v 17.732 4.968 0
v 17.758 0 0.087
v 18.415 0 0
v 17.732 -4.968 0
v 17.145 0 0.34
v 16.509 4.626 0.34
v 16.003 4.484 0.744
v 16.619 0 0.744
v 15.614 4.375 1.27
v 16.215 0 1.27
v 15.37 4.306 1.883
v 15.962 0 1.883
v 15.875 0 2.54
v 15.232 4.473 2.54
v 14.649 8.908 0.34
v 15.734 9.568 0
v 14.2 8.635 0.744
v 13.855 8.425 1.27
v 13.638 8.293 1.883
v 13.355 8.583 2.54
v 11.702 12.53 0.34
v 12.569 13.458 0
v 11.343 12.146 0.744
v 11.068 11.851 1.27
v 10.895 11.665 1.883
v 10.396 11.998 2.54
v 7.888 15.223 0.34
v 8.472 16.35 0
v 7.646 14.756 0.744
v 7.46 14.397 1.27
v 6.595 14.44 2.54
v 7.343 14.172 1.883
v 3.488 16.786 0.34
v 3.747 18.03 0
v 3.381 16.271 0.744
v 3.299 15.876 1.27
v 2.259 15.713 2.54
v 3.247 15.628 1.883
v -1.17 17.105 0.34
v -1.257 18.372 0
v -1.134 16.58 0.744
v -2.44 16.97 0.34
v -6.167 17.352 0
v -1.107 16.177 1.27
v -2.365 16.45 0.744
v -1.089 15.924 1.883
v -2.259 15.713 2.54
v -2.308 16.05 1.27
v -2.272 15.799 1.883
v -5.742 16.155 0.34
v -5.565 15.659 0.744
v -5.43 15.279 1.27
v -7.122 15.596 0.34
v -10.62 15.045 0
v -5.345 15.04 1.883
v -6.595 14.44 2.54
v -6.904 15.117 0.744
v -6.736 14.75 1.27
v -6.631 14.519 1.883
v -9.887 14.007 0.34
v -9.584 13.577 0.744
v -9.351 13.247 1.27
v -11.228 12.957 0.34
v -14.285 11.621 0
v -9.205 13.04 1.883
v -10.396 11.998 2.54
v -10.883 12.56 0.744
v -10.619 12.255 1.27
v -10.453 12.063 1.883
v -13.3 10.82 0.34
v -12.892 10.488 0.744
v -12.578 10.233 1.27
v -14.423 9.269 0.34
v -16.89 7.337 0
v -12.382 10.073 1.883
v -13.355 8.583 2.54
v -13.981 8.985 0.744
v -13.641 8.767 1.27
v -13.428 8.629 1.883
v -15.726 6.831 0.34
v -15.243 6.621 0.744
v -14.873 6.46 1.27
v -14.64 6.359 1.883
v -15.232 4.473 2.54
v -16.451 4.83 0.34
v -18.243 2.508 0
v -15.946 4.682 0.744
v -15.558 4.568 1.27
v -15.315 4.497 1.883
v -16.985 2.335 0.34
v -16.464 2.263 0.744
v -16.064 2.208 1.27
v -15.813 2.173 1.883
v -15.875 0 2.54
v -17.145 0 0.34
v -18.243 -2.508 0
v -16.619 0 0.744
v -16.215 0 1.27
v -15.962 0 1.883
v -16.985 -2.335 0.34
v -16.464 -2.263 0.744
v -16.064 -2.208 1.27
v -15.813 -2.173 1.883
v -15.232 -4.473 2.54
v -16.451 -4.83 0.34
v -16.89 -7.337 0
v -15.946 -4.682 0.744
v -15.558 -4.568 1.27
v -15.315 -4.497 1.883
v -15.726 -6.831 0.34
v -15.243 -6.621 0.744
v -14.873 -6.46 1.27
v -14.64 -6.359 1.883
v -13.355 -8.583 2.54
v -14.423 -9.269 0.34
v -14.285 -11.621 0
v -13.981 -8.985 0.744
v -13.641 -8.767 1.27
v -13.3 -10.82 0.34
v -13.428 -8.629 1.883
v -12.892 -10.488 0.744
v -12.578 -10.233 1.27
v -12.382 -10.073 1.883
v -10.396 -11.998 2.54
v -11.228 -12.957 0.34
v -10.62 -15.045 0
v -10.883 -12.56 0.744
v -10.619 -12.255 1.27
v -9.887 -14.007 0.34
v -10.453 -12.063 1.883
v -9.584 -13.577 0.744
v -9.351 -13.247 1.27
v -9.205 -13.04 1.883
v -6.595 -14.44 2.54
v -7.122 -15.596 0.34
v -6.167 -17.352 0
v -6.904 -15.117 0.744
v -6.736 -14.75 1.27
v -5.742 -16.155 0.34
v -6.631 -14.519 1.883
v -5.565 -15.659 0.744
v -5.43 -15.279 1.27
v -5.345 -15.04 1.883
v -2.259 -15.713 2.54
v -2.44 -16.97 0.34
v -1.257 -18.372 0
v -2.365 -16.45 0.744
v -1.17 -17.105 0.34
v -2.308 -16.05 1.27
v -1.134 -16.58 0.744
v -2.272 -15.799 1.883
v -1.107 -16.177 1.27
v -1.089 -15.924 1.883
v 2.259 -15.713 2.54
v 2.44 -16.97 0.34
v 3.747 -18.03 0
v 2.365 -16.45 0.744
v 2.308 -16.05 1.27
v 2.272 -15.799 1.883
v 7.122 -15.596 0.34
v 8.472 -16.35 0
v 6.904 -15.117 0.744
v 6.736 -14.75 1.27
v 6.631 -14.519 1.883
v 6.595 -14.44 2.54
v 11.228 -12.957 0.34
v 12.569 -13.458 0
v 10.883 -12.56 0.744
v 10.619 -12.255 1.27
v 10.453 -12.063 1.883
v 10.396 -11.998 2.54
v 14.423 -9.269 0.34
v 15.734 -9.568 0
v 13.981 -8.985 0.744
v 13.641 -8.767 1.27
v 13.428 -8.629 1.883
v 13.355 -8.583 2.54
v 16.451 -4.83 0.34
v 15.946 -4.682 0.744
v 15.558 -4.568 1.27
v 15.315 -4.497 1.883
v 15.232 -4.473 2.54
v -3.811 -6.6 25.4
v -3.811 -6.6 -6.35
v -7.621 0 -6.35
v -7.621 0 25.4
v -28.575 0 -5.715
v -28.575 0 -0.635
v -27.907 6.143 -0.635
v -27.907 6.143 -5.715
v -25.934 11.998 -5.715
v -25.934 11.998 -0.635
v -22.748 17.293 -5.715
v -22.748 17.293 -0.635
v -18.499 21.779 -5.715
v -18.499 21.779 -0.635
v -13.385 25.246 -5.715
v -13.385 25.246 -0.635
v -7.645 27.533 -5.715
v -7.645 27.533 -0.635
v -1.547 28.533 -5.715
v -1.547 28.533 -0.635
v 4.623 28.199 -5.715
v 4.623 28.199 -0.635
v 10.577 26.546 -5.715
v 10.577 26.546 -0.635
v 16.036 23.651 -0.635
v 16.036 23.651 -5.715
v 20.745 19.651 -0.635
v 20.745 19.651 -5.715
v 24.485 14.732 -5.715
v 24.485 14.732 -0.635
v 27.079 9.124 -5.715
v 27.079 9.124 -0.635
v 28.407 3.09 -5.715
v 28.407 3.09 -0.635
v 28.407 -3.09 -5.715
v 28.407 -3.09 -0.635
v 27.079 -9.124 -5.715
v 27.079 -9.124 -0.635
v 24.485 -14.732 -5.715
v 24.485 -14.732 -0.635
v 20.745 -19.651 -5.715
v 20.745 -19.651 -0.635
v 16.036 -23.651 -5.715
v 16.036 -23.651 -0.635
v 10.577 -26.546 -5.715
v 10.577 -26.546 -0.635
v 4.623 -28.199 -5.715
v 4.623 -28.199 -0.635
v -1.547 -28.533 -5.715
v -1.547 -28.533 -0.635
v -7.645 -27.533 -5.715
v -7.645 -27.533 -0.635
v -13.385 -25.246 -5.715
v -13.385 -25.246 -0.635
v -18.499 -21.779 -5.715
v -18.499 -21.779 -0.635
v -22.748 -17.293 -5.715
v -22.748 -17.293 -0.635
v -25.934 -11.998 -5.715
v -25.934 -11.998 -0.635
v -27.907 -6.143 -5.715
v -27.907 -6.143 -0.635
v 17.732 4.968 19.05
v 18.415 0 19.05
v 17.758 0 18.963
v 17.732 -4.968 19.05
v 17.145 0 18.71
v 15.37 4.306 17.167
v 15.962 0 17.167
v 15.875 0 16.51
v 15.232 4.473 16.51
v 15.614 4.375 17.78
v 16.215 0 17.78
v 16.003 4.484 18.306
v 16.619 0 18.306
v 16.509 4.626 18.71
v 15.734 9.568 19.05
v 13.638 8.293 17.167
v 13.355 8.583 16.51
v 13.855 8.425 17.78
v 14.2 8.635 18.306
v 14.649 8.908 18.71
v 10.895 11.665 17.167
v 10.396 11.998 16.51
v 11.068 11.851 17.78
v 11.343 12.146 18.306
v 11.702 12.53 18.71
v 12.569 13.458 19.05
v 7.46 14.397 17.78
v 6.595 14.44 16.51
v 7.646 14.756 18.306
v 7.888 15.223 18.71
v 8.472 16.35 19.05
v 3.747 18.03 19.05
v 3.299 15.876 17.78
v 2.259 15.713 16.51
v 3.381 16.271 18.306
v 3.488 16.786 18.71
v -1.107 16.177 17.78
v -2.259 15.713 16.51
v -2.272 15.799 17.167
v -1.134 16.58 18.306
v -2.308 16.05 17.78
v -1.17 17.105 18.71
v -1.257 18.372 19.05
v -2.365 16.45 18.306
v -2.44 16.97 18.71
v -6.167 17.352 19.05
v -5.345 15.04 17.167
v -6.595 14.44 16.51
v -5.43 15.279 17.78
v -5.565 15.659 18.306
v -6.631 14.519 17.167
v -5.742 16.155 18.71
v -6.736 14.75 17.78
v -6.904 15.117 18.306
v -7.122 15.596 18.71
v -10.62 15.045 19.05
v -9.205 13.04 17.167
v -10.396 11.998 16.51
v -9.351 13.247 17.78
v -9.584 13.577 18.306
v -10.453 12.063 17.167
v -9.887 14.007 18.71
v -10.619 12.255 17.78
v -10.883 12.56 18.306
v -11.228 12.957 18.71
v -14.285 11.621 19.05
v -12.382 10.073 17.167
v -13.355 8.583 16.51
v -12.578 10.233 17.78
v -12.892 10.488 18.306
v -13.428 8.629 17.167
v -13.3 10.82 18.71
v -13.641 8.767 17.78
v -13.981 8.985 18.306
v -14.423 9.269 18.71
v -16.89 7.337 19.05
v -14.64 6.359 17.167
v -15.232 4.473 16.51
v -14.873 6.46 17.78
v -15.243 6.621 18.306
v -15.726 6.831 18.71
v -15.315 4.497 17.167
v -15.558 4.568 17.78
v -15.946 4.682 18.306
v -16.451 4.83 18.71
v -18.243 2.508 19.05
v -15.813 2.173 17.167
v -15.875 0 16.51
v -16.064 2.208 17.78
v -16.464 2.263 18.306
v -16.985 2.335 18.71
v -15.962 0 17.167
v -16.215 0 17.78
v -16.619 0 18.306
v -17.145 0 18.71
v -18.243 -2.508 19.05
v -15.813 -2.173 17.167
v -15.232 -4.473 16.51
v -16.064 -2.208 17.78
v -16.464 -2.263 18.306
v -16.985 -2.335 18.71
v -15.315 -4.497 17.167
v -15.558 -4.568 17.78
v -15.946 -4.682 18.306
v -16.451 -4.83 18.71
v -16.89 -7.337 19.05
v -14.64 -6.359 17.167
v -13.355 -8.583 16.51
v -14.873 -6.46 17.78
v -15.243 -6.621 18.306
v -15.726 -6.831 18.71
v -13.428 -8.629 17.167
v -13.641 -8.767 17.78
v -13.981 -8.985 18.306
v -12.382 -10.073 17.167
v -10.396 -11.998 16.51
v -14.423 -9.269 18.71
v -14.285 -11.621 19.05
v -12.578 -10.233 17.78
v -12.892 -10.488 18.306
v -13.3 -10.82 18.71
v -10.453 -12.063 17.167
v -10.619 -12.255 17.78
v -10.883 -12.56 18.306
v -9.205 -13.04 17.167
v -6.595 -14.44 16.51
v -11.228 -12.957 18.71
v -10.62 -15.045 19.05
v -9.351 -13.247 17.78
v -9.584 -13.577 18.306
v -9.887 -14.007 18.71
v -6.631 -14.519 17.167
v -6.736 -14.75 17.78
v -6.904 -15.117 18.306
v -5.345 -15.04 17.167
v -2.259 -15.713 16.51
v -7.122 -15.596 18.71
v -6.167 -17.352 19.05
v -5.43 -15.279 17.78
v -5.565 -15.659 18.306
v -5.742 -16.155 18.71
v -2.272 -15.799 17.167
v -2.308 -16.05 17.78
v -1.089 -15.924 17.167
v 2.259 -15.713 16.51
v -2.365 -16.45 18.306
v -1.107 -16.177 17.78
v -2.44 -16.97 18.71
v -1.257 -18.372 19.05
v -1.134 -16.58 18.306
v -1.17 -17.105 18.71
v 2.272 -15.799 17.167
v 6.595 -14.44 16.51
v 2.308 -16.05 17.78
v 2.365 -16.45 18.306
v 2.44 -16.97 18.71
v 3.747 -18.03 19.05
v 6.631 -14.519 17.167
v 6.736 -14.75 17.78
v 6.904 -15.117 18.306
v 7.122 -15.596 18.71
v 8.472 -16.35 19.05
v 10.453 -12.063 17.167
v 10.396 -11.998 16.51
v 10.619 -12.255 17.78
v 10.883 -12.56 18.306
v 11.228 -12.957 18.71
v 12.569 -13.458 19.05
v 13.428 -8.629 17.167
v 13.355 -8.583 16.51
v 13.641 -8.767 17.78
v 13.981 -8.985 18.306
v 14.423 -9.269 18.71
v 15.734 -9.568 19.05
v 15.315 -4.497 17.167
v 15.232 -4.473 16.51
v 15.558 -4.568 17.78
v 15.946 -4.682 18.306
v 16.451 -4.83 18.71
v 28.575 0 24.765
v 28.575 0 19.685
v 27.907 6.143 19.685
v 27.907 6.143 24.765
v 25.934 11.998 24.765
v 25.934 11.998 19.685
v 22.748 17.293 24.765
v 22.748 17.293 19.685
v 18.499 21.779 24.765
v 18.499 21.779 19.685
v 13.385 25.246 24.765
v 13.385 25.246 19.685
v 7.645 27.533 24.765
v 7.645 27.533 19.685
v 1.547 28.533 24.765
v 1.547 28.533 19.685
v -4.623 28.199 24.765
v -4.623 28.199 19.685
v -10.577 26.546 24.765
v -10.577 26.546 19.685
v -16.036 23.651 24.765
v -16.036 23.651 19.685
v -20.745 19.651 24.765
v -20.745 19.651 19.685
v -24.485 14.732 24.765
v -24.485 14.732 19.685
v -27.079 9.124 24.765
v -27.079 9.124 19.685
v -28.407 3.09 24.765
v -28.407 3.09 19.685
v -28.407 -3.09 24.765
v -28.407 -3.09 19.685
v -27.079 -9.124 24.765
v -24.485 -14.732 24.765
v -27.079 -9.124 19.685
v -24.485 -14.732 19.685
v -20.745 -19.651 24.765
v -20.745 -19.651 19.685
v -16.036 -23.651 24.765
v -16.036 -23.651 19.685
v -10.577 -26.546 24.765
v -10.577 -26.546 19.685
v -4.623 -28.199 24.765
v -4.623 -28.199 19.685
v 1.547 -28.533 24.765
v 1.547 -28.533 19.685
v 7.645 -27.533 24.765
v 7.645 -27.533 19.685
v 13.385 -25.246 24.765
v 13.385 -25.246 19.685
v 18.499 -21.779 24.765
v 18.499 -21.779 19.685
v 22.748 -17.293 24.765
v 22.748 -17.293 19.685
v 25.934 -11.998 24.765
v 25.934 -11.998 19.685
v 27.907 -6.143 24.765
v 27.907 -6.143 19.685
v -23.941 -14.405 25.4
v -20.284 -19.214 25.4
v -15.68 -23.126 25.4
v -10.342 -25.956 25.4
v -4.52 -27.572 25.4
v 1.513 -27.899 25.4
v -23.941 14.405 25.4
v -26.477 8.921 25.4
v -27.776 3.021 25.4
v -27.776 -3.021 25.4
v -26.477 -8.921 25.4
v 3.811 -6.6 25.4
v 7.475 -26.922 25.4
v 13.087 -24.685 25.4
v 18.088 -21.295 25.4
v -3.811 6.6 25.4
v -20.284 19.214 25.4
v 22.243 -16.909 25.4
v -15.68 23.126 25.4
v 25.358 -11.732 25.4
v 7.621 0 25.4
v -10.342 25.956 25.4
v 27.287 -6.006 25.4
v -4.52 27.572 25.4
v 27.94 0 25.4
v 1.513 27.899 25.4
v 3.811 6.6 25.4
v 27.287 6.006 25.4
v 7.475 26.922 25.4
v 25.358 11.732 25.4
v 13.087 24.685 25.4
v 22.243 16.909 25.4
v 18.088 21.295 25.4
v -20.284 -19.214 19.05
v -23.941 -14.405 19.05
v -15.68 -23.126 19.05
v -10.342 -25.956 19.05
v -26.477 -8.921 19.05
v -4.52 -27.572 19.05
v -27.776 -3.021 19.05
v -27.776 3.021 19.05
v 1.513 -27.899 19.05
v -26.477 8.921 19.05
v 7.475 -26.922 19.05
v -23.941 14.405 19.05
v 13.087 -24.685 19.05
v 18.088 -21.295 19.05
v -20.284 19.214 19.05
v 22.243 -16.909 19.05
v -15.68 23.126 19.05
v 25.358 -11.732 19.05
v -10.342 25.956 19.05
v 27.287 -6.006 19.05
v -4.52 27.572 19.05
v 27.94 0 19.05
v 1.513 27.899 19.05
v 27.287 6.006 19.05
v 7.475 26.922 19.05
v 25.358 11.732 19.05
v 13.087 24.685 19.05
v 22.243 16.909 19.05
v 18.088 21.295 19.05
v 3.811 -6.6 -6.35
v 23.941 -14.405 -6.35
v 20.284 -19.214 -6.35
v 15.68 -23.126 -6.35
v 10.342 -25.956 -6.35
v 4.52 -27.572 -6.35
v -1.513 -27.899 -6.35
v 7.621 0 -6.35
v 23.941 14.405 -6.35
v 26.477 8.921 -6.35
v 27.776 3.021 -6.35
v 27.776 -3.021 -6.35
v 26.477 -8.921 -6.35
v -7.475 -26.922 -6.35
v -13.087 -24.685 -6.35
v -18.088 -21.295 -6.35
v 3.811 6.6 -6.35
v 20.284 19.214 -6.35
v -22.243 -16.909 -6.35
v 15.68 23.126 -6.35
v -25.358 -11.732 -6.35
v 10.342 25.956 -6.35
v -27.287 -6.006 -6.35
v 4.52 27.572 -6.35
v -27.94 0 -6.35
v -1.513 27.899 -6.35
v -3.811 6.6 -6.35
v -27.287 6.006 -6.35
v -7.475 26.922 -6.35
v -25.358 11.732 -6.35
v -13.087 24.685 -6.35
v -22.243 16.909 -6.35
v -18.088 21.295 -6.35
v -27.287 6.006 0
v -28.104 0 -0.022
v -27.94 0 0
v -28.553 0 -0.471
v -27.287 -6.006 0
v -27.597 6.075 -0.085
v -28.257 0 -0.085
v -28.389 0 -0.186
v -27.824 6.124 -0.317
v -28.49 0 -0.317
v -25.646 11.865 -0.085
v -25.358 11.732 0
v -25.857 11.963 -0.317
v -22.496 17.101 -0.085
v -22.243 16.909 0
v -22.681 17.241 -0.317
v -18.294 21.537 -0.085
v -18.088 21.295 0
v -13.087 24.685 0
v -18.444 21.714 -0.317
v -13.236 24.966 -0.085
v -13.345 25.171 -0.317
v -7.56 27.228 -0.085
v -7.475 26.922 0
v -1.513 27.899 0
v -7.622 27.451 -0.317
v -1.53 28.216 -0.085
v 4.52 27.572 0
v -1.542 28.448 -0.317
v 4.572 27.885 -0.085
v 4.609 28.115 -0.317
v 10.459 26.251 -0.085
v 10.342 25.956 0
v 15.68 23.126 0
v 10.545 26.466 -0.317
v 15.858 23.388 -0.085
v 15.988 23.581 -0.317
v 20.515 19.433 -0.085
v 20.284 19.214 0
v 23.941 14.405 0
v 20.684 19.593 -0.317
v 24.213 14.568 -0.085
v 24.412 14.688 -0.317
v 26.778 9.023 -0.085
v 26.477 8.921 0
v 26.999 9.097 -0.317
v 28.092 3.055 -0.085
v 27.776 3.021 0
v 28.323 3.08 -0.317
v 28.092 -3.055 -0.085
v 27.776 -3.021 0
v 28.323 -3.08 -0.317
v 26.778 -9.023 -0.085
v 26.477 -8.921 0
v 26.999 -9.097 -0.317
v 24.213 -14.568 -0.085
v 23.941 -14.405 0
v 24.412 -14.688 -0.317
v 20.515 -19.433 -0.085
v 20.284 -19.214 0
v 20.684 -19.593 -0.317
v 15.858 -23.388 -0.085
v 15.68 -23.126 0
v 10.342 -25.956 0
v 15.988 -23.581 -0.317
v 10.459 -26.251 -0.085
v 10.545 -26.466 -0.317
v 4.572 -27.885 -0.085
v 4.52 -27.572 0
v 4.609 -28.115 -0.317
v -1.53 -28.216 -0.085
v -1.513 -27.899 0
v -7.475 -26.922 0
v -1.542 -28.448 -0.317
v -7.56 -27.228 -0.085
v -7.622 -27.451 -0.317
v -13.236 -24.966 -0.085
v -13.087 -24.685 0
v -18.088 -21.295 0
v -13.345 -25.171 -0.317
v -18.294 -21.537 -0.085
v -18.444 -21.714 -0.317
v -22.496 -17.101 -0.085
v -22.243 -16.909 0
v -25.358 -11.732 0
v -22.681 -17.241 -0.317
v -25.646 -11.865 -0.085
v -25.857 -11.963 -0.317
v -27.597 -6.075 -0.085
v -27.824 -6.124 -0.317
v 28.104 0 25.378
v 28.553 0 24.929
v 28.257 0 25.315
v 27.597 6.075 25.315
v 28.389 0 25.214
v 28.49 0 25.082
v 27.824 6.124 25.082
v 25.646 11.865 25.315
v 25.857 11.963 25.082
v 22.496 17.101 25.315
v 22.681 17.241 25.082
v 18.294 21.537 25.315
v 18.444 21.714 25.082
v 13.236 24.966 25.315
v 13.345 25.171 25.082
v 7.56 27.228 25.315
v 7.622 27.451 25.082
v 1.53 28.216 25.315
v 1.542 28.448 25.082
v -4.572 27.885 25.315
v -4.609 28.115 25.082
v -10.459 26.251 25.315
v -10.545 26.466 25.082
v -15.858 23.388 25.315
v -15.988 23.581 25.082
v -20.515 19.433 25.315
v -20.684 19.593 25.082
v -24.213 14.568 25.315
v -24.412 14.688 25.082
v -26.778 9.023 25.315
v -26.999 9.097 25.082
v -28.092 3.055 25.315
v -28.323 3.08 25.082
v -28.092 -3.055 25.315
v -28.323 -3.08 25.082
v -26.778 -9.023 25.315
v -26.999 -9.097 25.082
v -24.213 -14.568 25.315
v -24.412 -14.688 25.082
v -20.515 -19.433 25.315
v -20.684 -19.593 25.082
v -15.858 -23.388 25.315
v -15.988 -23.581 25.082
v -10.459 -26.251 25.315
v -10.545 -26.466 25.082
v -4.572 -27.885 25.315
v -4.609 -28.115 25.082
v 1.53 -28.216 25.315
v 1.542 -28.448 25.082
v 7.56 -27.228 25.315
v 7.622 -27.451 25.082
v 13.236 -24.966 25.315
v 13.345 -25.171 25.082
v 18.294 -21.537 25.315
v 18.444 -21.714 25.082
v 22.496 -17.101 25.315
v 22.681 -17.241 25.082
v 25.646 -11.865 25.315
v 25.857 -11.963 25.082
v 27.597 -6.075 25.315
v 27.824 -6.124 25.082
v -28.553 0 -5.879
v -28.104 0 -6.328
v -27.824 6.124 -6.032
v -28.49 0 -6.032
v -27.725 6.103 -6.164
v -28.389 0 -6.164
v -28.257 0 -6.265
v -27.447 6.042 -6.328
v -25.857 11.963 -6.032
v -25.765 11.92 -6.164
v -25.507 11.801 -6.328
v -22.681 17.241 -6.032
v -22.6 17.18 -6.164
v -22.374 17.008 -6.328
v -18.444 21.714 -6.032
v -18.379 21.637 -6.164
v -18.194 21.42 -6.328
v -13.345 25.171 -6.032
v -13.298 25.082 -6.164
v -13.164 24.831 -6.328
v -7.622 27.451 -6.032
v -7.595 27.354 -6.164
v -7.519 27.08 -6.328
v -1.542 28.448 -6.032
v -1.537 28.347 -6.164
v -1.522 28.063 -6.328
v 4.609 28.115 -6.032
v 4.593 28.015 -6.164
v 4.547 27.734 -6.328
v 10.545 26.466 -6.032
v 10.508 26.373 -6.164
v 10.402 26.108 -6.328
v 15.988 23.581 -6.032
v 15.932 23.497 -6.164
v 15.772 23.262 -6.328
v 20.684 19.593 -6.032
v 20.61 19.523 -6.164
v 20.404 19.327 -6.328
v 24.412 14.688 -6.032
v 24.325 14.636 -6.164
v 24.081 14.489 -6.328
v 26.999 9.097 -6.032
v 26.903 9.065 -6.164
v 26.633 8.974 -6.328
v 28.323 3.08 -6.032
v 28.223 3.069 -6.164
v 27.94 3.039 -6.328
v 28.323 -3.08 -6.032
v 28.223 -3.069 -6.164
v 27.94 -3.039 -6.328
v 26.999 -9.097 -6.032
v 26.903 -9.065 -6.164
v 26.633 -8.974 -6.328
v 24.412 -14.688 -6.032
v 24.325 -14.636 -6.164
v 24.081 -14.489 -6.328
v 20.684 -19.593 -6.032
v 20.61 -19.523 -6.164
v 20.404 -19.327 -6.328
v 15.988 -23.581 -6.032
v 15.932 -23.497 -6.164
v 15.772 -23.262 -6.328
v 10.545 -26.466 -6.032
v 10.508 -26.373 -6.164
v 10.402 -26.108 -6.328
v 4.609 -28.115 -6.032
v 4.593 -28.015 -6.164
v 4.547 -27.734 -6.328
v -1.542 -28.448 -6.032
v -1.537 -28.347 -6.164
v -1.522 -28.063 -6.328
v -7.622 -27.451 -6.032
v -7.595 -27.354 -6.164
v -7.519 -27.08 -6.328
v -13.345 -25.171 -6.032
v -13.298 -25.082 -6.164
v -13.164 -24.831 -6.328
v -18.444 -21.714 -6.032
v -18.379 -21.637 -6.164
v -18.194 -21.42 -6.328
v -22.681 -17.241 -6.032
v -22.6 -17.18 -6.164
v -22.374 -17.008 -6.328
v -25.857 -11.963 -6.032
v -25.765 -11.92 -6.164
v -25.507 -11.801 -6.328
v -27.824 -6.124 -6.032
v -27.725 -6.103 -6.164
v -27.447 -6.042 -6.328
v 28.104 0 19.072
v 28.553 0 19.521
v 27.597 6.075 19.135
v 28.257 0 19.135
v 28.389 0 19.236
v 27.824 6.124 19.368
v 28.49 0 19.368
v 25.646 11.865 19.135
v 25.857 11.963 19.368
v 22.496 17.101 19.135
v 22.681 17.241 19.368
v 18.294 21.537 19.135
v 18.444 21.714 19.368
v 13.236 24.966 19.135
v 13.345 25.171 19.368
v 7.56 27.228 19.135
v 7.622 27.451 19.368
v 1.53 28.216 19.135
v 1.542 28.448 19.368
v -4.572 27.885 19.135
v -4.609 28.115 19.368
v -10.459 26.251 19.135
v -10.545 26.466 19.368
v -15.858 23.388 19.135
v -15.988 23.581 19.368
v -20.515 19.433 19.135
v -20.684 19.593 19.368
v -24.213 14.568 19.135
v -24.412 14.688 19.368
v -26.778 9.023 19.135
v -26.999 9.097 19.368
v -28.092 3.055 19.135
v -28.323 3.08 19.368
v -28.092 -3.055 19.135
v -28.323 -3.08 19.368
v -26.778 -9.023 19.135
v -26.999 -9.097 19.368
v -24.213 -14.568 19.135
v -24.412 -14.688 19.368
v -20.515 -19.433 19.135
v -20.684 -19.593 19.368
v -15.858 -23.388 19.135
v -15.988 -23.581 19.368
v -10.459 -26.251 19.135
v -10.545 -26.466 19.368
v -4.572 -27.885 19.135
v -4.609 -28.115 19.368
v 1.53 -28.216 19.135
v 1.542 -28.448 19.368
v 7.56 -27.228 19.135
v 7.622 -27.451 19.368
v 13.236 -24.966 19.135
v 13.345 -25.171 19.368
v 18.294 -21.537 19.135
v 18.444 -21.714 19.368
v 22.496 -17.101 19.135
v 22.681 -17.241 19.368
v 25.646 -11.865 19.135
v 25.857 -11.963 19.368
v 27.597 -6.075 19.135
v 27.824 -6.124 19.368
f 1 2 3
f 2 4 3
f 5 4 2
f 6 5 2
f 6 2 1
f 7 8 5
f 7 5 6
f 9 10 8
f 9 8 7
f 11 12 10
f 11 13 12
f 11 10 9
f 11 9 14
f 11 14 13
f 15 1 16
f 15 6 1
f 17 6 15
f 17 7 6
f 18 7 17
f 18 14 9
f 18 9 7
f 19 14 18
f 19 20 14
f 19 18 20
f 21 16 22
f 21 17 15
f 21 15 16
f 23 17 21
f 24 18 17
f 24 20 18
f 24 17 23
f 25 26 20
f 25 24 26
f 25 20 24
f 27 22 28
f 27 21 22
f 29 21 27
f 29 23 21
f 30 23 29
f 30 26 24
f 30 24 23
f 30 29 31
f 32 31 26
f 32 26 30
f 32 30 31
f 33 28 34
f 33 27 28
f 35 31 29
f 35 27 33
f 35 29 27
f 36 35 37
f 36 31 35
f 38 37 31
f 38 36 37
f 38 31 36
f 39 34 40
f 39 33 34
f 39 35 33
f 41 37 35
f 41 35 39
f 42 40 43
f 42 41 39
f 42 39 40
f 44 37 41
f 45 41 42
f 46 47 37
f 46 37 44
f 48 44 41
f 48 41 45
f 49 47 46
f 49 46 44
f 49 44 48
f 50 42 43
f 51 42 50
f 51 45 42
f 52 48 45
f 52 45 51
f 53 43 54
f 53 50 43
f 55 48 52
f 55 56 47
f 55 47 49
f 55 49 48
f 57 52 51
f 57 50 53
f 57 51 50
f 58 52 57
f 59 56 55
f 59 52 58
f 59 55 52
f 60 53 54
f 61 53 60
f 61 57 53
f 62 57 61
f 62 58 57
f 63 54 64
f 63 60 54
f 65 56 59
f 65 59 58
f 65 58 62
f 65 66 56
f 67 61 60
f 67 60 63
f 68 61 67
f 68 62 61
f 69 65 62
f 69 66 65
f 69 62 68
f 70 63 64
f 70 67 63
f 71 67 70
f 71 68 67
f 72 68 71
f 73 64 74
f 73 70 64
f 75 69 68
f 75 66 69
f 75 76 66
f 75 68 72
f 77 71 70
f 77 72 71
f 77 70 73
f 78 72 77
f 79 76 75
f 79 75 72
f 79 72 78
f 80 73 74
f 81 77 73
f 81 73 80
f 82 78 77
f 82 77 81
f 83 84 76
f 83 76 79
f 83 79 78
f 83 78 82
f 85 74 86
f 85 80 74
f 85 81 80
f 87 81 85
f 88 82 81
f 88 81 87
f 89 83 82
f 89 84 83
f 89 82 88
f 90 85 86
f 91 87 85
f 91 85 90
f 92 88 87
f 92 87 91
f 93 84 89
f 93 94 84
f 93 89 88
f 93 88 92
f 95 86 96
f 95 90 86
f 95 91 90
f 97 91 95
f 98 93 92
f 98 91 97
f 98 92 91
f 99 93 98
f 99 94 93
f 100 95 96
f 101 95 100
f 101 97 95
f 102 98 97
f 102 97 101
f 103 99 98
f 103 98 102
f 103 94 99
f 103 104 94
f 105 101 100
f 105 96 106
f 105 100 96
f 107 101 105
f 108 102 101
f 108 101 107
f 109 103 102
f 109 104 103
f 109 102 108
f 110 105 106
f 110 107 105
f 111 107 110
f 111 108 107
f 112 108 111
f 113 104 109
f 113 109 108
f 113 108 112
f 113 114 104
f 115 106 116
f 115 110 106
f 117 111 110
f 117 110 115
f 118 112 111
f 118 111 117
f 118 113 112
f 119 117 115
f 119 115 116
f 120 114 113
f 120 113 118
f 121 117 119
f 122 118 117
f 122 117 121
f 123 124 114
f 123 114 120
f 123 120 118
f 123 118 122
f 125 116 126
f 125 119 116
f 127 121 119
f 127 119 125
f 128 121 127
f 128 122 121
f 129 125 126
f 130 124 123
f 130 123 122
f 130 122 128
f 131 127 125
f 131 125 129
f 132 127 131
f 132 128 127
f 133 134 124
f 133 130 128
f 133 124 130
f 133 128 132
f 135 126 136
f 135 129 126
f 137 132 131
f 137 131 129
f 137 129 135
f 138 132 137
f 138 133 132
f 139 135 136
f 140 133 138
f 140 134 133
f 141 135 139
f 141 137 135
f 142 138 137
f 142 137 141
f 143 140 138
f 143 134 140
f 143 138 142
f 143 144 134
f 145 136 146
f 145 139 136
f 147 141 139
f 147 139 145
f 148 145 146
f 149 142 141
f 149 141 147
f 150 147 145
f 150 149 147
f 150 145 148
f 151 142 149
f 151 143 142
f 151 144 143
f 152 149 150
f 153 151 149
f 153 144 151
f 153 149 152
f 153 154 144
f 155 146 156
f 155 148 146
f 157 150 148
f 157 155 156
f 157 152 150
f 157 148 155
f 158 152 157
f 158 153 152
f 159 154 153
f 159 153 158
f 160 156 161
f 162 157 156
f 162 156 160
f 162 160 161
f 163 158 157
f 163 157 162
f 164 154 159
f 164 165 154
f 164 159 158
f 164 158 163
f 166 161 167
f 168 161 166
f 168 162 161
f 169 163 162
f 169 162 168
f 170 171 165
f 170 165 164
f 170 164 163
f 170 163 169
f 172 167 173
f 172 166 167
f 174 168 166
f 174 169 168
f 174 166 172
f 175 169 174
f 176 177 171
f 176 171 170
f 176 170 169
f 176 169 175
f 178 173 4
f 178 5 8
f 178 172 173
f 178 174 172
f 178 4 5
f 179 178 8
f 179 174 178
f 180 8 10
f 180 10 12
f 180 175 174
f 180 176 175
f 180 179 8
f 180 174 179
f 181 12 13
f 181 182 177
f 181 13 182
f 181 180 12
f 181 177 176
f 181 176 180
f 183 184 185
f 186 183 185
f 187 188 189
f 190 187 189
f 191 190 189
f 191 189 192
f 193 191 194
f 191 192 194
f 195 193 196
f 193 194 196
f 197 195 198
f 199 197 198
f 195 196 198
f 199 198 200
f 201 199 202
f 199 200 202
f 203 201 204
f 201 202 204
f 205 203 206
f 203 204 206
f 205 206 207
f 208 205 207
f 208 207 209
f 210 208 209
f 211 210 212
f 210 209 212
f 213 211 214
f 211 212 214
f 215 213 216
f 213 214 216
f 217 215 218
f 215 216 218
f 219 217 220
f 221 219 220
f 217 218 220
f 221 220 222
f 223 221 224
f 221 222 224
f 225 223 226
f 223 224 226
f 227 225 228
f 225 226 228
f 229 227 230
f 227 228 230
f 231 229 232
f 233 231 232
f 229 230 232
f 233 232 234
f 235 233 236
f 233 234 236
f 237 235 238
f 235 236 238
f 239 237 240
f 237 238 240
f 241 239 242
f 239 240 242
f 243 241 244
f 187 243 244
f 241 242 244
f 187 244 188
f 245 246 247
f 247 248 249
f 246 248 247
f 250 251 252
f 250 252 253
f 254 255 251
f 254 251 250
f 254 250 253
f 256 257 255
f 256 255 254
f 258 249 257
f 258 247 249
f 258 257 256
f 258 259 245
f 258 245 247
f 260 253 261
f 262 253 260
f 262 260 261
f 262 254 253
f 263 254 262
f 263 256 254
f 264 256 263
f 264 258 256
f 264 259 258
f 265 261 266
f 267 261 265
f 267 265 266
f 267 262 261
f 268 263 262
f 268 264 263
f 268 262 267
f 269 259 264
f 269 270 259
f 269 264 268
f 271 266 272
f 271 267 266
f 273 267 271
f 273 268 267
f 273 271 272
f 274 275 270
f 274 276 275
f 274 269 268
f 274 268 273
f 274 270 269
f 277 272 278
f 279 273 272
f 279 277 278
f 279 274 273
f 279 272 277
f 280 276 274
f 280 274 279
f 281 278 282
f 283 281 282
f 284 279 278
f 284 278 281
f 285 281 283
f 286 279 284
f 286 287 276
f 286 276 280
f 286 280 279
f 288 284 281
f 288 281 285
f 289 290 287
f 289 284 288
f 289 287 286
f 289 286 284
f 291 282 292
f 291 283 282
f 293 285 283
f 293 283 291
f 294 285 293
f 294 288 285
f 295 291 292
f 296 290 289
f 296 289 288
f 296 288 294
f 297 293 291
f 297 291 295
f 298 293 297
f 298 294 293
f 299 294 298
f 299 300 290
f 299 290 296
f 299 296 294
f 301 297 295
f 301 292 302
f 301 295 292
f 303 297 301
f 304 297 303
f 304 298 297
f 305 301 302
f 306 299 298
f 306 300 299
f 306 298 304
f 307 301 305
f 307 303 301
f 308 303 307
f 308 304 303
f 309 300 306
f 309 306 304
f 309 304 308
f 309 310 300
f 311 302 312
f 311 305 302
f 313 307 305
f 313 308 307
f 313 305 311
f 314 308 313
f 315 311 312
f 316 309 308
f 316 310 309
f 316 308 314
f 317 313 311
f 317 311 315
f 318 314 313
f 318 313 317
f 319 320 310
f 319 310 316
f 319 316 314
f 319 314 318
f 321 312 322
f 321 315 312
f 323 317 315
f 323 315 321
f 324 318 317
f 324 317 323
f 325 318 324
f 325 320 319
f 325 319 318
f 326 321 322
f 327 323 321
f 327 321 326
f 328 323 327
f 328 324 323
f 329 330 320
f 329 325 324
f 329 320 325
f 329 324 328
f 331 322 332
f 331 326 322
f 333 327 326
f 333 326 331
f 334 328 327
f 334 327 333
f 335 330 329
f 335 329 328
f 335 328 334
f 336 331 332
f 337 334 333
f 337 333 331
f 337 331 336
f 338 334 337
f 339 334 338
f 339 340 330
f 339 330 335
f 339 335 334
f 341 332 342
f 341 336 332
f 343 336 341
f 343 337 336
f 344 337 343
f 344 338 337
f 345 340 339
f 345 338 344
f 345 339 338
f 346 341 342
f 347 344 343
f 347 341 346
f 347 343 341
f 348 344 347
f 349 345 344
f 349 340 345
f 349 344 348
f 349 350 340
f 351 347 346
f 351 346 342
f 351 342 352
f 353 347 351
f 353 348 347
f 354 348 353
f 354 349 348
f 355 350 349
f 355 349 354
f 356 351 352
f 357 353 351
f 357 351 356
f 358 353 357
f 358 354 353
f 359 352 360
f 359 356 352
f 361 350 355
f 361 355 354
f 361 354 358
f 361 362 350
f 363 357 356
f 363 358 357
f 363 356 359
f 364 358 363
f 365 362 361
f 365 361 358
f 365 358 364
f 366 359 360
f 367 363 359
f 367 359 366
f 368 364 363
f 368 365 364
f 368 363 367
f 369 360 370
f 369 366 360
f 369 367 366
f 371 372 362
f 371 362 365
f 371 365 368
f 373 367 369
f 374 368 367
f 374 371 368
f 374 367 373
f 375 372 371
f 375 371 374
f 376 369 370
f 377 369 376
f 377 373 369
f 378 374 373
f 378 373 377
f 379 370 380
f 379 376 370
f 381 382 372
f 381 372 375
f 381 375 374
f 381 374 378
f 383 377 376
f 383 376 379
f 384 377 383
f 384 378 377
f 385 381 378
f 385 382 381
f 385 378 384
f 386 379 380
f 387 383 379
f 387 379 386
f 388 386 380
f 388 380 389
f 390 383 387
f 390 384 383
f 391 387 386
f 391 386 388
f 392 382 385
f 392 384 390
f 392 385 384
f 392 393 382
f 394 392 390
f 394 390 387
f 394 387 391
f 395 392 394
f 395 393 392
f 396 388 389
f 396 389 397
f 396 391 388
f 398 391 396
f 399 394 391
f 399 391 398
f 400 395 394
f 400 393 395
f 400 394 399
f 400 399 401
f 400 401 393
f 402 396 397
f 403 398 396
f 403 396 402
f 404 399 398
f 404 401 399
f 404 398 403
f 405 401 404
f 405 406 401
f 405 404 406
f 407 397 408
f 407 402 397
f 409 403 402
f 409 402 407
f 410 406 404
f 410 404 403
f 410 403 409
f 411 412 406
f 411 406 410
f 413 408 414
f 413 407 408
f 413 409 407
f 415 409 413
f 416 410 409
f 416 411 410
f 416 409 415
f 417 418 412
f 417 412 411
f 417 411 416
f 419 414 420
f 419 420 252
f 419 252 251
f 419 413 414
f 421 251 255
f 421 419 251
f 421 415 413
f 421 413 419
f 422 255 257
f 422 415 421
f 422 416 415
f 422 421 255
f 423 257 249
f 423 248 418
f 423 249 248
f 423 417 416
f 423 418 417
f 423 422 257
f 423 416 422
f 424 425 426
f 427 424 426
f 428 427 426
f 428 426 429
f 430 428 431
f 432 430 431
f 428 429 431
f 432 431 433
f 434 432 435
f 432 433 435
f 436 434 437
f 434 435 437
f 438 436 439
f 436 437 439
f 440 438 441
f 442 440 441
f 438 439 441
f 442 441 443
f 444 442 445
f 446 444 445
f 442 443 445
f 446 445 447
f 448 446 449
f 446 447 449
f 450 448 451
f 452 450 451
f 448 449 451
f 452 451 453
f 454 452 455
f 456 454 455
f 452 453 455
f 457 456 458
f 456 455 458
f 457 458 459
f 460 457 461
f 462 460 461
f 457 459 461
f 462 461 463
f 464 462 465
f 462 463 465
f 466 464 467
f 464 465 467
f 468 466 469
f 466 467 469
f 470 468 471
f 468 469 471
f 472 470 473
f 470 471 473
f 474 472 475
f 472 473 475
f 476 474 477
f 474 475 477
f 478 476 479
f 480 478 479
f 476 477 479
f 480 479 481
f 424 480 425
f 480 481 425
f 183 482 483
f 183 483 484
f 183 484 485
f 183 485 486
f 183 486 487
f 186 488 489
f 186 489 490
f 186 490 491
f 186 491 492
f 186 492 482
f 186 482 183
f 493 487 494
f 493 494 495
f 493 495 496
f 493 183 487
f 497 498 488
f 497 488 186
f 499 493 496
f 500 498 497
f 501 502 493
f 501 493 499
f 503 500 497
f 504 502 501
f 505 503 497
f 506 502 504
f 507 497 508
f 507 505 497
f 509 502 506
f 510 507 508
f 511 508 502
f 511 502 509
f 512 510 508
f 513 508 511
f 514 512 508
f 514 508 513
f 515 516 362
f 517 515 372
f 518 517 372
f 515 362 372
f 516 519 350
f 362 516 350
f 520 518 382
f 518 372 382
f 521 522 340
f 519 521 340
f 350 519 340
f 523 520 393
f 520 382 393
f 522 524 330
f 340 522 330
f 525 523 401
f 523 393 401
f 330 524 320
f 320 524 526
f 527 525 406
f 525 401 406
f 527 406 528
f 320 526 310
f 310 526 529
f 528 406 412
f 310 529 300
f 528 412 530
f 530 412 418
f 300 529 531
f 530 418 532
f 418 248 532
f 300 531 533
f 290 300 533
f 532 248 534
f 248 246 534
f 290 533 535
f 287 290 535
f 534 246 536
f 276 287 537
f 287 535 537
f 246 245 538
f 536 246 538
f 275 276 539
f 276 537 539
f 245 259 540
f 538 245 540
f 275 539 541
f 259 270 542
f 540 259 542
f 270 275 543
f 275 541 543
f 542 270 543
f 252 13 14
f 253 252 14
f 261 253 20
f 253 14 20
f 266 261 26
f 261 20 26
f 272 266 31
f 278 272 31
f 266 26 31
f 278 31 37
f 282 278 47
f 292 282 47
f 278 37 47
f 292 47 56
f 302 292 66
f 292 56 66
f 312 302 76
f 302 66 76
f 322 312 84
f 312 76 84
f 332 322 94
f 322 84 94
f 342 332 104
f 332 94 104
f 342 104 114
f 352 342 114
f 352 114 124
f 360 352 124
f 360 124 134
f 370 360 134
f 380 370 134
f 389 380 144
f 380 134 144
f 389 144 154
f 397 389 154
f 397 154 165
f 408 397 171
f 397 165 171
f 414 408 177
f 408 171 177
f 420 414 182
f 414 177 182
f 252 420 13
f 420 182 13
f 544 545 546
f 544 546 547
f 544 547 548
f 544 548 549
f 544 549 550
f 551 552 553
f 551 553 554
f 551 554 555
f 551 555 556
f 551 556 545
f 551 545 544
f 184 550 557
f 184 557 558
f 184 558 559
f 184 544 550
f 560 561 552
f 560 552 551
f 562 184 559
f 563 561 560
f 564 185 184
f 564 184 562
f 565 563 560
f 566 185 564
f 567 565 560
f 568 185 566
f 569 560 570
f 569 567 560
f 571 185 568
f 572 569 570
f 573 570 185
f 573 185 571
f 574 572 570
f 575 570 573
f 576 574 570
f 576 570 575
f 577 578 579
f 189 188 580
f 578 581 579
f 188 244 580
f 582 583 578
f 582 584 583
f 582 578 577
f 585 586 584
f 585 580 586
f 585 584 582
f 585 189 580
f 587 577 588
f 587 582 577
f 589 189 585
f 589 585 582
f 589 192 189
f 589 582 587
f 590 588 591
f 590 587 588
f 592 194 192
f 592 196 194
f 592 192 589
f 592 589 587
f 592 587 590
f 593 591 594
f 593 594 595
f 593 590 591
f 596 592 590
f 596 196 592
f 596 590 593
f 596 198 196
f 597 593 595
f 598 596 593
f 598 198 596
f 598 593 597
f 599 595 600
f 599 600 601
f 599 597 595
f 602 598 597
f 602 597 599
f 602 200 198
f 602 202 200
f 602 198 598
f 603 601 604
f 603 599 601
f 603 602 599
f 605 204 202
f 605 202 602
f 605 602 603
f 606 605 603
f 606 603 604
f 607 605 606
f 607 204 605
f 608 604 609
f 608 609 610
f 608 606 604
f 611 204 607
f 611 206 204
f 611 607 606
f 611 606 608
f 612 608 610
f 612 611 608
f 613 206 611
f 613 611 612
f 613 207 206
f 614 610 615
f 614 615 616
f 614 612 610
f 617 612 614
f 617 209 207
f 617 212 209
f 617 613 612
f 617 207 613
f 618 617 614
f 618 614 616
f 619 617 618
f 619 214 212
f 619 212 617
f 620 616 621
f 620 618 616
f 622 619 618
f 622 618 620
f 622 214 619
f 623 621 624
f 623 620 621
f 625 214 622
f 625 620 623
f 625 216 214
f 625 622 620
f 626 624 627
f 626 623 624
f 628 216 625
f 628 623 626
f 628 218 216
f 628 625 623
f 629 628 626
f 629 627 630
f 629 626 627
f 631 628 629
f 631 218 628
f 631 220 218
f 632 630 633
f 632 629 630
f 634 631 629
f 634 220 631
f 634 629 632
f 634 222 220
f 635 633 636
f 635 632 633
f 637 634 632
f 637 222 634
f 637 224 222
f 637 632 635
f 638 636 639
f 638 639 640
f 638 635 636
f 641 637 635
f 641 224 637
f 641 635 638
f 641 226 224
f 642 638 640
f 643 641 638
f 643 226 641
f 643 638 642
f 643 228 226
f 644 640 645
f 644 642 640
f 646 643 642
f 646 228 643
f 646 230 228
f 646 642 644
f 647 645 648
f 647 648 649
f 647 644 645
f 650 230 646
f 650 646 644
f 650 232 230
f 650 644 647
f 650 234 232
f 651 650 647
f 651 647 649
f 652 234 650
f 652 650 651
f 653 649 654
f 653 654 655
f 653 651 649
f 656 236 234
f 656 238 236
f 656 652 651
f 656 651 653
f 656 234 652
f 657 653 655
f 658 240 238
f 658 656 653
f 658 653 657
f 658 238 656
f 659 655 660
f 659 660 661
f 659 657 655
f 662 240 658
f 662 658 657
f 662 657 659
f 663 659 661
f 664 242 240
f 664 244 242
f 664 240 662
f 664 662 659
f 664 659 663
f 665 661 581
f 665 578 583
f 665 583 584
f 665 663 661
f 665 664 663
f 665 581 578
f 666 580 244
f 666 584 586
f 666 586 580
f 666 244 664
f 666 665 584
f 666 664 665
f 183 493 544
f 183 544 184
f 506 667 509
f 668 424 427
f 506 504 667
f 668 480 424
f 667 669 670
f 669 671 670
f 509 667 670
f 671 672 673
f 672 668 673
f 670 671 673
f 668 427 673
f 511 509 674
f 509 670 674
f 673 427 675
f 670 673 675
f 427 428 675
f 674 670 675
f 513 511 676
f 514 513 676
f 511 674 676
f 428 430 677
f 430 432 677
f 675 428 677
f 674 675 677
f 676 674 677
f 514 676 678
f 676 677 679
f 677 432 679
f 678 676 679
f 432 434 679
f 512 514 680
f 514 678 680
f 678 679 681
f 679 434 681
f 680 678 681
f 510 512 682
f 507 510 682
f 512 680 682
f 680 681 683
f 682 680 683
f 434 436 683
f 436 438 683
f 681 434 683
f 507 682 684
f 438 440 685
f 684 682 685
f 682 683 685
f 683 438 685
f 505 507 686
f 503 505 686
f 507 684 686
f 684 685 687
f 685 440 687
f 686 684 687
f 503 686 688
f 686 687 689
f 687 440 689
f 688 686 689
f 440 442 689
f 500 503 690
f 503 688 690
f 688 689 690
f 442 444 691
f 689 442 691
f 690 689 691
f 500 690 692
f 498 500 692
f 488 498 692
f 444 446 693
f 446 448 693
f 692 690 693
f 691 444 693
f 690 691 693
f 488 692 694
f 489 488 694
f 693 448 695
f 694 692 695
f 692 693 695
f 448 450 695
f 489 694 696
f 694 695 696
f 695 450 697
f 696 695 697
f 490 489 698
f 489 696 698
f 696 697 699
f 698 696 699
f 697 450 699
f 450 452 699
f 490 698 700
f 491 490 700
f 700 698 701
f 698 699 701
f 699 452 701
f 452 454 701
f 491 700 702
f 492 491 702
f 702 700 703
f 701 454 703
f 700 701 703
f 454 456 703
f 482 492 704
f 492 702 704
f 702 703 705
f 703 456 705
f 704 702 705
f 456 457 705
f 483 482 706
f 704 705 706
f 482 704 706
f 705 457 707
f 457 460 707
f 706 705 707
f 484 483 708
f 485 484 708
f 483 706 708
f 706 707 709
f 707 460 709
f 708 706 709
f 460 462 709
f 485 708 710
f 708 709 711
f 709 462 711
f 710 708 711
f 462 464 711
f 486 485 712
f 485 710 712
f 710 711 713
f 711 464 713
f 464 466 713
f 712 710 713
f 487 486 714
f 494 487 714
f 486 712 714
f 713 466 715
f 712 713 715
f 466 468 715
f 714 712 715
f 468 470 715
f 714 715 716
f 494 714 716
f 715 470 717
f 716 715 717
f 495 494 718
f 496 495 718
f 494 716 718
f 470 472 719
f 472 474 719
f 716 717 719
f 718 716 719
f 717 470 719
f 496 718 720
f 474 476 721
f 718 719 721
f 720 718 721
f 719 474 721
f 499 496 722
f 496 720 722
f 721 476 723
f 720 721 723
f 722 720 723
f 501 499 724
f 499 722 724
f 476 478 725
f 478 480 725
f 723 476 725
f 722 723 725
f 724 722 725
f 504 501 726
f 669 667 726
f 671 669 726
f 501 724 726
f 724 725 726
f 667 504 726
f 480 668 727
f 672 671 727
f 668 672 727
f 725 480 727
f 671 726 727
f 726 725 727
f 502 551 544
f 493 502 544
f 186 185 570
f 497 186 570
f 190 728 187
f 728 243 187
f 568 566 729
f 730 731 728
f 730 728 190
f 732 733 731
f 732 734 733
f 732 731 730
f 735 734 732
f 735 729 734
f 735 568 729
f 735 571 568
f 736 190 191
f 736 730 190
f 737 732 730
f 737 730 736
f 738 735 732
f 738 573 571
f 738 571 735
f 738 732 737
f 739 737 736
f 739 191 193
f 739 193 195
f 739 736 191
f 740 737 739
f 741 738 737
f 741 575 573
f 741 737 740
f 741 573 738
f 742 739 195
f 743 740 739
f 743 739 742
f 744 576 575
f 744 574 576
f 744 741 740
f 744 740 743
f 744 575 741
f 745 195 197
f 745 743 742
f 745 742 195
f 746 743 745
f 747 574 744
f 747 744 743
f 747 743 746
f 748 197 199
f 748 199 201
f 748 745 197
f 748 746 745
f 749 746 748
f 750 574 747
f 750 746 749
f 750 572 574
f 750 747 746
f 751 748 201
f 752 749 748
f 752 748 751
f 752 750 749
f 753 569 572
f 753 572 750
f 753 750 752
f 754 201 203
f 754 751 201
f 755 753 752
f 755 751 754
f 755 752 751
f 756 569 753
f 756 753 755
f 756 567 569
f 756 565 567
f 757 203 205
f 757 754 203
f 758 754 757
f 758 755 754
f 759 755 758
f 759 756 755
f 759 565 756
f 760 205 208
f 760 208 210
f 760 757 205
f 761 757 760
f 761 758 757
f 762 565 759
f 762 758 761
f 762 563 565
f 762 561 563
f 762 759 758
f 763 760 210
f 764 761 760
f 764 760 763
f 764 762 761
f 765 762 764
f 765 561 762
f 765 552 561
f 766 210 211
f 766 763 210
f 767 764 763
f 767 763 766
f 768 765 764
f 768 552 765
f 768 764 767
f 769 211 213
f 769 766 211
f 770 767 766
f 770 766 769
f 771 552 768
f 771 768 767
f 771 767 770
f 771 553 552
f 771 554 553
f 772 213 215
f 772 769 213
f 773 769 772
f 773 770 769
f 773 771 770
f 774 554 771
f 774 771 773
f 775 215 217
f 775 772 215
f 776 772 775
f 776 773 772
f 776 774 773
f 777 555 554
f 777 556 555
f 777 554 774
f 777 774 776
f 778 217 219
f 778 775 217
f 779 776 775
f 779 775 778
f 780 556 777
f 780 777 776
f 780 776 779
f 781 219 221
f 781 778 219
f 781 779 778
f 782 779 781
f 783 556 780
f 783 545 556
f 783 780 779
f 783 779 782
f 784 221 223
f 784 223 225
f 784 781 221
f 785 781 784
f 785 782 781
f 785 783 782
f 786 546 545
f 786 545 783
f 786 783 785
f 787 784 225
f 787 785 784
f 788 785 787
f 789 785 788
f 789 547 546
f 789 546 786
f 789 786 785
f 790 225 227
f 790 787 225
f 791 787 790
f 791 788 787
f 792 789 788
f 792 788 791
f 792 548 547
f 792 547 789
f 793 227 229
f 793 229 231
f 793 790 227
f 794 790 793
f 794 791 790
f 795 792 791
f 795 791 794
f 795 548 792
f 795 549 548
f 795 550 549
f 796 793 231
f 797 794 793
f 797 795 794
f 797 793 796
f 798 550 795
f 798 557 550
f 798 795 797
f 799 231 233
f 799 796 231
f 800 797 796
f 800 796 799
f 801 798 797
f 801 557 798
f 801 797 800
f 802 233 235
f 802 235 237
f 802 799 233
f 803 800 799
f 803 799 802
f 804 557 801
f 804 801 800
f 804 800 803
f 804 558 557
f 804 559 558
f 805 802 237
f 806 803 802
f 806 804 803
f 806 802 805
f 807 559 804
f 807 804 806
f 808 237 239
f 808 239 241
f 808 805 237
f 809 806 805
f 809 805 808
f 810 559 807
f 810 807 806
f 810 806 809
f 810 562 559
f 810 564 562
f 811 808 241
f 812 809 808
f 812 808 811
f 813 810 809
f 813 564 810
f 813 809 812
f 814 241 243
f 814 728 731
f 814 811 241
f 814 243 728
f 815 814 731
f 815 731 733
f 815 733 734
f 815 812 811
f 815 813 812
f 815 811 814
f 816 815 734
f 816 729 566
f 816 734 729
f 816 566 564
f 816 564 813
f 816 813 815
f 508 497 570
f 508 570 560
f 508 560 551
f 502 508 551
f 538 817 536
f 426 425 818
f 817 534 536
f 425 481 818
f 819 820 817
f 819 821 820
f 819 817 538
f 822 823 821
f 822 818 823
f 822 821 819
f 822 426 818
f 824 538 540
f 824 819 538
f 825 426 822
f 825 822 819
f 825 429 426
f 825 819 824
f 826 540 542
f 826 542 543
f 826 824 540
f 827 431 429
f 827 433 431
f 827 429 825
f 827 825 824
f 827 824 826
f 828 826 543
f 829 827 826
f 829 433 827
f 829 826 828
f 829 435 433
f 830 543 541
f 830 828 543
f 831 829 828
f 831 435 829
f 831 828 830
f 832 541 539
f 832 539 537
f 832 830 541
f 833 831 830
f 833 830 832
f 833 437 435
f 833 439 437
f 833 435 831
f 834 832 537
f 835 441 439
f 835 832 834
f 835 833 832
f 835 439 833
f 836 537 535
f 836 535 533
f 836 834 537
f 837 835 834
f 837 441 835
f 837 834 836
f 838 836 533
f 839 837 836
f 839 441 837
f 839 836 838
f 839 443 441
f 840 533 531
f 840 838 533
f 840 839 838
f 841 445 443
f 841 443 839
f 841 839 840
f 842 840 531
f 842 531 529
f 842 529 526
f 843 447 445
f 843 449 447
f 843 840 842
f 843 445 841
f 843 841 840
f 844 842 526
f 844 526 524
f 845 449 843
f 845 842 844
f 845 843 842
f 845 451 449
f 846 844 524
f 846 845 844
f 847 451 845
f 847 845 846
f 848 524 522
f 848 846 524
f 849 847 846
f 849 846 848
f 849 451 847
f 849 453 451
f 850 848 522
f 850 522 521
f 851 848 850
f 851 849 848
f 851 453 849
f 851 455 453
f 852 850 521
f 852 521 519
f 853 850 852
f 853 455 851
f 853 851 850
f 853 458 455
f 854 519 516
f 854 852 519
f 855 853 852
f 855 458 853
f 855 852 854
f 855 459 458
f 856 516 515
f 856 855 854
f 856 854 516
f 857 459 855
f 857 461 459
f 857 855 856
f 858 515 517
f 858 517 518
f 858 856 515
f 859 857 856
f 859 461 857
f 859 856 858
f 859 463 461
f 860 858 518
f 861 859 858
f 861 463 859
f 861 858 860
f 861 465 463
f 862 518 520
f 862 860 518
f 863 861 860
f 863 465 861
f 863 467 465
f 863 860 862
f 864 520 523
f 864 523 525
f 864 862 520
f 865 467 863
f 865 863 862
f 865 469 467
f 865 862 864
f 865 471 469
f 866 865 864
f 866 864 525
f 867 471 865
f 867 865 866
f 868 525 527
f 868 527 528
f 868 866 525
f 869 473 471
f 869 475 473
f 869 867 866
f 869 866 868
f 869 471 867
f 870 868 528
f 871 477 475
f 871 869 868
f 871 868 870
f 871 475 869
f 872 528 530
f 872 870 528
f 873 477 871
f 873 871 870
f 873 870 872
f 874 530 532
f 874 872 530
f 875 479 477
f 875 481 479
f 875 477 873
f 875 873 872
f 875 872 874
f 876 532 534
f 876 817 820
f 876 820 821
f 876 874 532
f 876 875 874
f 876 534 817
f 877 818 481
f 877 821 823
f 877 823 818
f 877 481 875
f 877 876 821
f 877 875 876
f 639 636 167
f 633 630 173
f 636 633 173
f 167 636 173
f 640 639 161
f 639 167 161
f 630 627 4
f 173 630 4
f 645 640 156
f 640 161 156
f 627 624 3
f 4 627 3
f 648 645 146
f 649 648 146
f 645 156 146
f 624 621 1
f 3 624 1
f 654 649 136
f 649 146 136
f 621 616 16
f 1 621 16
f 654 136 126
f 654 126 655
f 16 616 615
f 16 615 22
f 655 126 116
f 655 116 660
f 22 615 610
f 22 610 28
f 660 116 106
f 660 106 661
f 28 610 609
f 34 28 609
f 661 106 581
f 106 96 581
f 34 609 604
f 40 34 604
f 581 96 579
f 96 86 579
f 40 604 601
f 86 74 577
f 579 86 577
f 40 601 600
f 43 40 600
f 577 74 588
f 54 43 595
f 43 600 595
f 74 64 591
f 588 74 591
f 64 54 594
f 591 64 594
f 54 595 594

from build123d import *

# Parameters (mm, degrees)
SKETCH1_R           = 15.875
BOSS_EXTRUDE1_DEPTH = 19.05
SKETCH2_R           = 28.575
BOSS_EXTRUDE2_DEPTH = 6.35
SKETCH3_R           = 28.575
BOSS_EXTRUDE3_DEPTH = 6.35
CUT_EXTRUDE1_DEPTH  = 32.75
FILLET1_R           = 2.54
FILLET2_R           = 0.635


with BuildPart() as part:
    # Sketch1 → Boss-Extrude1 (new body)
    with BuildSketch(Plane.XY):
        Circle(SKETCH1_R)
    extrude(amount=BOSS_EXTRUDE1_DEPTH)

    # Sketch2 → Boss-Extrude2 (add)
    with BuildSketch(Plane.XY.offset(19.05)):
        Circle(SKETCH2_R)
    extrude(amount=BOSS_EXTRUDE2_DEPTH)

    # Sketch3 → Boss-Extrude3 (add)
    with BuildSketch(Plane(origin=(0, 0, 0), x_dir=(-1, 0, 0), z_dir=(0, 0, -1))):
        Circle(SKETCH3_R)
    extrude(amount=BOSS_EXTRUDE3_DEPTH)

    # Sketch4 → Cut-Extrude1 (cut, through all)
    with BuildSketch(Plane(origin=(0, 0, -6.35), x_dir=(-1, 0, 0), z_dir=(0, 0, -1))):
        Polygon((7.621023553, 0), (3.810511777, 6.6), (-3.810511777, 6.6), (-7.621023553, 0), (-3.810511777, -6.6), (3.810511777, -6.6), align=None)
    extrude(amount=-CUT_EXTRUDE1_DEPTH, mode=Mode.SUBTRACT)

    # Fillet1
    fillet1_edges = [part.edges().sort_by_distance(p)[0] for p in [
        (-15.875, 0, 19.05),
        (-15.875, 0, 0),
    ]]
    fillet(fillet1_edges, radius=FILLET1_R)

    # Fillet2
    fillet2_edges = [part.edges().sort_by_distance(p)[0] for p in [
        (28.575, 0, -6.35),
        (-28.575, 0, 19.05),
        (-28.575, 0, 25.4),
        (28.575, 0, 0),
    ]]
    fillet(fillet2_edges, radius=FILLET2_R)


solid = part.part
